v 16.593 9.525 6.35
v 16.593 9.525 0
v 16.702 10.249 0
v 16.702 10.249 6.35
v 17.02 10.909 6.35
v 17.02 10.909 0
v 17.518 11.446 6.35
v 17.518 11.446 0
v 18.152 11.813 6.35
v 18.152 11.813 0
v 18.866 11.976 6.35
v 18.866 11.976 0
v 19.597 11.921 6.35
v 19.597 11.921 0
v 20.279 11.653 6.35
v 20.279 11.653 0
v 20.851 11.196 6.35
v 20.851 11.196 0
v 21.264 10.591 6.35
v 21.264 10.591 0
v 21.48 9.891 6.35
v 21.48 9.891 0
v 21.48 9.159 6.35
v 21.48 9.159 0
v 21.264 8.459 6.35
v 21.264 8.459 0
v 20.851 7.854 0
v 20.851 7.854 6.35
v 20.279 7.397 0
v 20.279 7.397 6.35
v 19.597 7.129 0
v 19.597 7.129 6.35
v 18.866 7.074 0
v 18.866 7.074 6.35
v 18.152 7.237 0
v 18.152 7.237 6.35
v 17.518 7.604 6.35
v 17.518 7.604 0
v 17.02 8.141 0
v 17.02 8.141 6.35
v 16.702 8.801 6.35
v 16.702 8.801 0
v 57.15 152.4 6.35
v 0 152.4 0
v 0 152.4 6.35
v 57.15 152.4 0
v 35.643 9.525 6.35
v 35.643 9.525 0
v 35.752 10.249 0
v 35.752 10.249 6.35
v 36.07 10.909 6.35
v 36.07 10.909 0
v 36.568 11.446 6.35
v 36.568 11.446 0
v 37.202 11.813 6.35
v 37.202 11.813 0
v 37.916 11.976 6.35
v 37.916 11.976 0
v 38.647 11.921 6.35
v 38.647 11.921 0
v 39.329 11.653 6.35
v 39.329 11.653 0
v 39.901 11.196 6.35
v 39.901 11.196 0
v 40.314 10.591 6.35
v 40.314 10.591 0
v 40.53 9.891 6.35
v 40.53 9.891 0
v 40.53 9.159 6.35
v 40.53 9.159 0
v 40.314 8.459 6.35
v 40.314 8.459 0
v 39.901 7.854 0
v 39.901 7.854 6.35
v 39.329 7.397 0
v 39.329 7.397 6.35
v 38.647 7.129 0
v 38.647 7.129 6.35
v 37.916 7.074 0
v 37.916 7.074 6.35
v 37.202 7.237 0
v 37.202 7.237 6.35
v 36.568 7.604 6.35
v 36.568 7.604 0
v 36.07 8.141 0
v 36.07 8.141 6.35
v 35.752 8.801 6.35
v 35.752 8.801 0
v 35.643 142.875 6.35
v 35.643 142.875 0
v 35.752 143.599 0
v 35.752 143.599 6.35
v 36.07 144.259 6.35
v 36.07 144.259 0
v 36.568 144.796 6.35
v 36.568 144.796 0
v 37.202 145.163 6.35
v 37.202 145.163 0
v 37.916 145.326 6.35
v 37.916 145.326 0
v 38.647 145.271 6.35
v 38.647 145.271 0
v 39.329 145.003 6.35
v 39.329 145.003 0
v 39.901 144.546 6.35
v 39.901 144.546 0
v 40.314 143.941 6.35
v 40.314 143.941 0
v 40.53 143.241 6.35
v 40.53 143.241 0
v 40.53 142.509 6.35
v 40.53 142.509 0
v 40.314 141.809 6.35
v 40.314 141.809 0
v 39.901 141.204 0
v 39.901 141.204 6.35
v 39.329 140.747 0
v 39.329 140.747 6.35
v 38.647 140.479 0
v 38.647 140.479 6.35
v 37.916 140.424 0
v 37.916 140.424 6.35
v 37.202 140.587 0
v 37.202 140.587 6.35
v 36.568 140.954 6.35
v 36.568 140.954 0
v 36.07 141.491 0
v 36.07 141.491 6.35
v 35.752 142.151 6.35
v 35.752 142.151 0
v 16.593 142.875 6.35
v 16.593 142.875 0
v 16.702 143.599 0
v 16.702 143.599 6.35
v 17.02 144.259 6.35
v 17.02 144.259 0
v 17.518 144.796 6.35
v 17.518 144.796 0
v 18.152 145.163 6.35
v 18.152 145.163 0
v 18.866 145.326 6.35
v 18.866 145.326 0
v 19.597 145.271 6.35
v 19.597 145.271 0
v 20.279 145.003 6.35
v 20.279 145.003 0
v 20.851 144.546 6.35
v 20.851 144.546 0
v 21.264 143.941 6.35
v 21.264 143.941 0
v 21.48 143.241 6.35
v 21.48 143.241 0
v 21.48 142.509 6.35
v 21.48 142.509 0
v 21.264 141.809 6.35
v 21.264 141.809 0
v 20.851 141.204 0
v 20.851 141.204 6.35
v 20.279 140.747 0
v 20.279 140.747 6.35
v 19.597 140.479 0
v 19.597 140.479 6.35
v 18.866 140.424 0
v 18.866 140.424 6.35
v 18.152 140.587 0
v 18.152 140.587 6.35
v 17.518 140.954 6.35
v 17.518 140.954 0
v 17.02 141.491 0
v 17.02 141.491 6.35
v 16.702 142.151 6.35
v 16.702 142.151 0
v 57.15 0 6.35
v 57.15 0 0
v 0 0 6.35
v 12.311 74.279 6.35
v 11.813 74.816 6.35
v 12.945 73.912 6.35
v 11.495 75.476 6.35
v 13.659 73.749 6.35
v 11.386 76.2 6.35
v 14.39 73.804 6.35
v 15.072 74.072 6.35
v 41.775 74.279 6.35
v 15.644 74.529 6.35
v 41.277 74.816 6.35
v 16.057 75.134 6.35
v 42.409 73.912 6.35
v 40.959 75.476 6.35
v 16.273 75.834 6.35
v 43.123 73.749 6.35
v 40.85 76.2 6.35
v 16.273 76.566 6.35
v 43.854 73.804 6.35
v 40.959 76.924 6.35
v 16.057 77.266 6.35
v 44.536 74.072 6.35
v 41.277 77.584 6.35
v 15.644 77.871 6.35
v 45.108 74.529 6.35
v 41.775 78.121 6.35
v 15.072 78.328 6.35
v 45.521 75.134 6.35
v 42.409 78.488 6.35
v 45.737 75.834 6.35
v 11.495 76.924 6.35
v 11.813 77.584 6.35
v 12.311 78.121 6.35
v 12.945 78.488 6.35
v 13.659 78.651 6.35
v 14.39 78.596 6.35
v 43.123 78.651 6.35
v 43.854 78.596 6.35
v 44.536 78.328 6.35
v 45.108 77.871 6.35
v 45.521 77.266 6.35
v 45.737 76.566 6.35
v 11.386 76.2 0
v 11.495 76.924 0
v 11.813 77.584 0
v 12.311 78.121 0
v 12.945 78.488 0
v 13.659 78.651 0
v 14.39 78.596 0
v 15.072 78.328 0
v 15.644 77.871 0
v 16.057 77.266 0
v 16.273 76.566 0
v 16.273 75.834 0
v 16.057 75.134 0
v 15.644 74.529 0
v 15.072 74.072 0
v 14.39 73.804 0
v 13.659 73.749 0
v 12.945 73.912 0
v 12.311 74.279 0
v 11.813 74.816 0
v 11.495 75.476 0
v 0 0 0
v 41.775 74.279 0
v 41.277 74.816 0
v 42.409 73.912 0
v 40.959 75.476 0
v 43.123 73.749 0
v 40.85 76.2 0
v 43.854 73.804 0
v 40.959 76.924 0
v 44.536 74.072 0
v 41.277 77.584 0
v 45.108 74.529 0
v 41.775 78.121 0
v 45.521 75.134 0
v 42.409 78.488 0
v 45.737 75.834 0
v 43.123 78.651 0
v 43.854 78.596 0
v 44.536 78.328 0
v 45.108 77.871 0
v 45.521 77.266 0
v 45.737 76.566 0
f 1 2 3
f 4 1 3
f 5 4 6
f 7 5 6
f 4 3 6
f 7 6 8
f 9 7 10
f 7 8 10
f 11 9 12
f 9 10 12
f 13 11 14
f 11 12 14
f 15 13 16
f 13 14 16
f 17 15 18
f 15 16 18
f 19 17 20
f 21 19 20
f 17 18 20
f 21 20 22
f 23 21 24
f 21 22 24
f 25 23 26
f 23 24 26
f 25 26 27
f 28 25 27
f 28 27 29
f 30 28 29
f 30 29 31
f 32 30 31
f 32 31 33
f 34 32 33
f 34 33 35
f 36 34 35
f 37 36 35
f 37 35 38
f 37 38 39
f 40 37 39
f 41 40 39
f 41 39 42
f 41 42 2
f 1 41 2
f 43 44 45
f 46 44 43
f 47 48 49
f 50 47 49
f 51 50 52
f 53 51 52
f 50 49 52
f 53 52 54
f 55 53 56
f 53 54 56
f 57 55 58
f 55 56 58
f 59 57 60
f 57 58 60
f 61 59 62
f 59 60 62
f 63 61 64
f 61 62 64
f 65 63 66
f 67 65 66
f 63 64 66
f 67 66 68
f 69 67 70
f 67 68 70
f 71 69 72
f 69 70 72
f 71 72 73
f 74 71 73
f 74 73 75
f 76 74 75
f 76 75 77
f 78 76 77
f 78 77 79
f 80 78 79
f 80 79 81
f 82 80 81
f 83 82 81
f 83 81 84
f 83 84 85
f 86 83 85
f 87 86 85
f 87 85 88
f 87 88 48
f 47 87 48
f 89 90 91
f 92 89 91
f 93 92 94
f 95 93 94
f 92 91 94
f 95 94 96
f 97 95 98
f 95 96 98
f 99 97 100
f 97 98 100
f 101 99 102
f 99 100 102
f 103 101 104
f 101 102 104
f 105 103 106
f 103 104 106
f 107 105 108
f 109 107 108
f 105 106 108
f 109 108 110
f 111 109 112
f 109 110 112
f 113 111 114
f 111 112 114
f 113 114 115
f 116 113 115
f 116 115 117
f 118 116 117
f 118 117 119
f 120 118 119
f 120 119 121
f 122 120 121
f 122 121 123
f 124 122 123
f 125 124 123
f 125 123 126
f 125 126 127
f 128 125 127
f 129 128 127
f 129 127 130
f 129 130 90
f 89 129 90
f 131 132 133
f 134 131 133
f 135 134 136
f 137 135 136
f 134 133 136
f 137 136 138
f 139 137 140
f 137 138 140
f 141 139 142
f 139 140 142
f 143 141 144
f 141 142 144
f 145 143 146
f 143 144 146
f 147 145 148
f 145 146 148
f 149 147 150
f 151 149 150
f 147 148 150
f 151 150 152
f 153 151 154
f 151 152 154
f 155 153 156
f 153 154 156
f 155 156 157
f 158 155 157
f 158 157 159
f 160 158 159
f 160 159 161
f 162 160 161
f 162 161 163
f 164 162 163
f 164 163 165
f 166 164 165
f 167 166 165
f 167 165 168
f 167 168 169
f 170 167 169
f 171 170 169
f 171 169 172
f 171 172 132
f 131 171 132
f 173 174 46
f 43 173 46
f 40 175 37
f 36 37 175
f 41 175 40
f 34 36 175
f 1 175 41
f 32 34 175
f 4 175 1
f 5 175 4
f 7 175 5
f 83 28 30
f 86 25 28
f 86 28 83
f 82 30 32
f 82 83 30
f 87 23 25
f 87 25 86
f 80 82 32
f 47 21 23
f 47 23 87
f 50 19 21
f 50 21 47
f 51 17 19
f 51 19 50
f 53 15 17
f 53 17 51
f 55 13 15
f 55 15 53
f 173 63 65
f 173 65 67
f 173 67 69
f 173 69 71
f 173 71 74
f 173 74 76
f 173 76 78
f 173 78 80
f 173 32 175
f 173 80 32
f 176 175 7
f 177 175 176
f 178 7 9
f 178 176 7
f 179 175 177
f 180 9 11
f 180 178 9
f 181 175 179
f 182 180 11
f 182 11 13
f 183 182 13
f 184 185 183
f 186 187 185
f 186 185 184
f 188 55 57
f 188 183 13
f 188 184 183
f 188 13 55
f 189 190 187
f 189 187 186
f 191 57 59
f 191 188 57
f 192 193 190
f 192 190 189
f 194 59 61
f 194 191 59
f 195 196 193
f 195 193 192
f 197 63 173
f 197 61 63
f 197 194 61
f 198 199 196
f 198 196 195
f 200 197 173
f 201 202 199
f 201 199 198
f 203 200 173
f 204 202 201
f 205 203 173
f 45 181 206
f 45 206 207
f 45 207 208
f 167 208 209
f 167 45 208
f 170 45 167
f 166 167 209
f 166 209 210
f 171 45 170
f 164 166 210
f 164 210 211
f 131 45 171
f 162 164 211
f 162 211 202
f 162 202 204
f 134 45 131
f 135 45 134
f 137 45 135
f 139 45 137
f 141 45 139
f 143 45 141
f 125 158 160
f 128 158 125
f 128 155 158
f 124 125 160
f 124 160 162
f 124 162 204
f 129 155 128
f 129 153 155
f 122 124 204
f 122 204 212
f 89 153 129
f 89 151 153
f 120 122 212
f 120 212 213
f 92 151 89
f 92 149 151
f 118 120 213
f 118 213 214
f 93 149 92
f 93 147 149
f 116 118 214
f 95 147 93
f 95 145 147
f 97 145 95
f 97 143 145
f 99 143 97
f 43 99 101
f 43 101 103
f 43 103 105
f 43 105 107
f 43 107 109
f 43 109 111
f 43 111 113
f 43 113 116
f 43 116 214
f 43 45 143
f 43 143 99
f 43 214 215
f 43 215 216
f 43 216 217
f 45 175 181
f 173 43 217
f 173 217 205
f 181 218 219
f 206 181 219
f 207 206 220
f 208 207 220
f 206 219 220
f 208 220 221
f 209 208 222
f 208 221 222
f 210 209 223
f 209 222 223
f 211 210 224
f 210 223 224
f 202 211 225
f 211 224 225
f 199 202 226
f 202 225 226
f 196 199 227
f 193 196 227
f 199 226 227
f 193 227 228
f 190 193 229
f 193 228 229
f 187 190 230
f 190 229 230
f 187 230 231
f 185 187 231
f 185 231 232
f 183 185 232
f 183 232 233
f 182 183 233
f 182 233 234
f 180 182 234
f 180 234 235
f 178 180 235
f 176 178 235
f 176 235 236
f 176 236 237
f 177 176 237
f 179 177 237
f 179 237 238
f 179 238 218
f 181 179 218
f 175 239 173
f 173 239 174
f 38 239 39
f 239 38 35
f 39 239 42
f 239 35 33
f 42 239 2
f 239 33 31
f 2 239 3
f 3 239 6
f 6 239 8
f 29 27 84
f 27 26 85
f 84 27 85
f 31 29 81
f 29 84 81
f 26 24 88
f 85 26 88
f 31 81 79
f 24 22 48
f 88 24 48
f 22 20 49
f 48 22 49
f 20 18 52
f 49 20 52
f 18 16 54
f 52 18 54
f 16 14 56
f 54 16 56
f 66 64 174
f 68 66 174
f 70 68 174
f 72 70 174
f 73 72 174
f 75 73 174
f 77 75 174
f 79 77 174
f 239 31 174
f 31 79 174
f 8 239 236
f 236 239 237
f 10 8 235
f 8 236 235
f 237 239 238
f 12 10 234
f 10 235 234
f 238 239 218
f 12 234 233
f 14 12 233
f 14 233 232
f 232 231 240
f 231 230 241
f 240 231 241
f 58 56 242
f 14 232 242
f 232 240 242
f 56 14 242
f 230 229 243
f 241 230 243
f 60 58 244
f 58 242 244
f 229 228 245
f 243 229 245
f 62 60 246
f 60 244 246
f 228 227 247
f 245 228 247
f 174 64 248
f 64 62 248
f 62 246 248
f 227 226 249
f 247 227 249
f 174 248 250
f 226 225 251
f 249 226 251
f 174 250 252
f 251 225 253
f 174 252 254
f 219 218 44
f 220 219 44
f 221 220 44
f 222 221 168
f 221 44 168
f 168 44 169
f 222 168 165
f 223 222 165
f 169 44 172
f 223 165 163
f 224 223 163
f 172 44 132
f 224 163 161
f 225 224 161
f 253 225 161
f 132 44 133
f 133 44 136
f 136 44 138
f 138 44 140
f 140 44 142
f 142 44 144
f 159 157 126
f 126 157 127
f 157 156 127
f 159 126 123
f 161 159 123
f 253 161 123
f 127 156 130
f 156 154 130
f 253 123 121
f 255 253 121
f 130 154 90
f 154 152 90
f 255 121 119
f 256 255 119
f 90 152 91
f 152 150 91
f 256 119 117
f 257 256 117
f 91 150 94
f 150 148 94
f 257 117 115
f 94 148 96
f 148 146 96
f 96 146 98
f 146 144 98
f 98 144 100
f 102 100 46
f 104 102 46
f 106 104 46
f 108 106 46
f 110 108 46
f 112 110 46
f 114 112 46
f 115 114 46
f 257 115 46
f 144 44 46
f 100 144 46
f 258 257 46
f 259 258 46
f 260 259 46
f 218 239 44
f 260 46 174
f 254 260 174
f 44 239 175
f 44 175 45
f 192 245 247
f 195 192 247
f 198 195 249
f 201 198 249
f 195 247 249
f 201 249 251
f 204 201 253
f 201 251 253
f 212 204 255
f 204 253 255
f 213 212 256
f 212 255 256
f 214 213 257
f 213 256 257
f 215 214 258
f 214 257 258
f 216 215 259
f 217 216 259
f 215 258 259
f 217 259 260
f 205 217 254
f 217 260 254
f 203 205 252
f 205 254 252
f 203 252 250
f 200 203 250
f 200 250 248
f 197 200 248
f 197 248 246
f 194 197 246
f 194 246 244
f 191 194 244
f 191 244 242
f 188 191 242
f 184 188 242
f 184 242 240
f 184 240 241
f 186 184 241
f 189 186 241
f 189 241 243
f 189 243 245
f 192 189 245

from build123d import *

# Parameters (mm, degrees)
SKETCH2_W                 = 57.15
SKETCH2_H                 = 152.4
BOSS_EXTRUDE1_DEPTH       = 6.35
F_8_CLEARANCE_HOLE1_D     = 4.9149
F_8_CLEARANCE_HOLE1_DEPTH = 9.191415072
F_8_CLEARANCE_HOLE1_TIP   = 1.476584928


with BuildPart() as part:
    # Sketch2 → Boss-Extrude1 (new body)
    with BuildSketch(Plane.XY):
        with Locations((28.575, 76.2)):
            Rectangle(SKETCH2_W, SKETCH2_H)
    extrude(amount=BOSS_EXTRUDE1_DEPTH)

    # #8 Clearance Hole1
    with Locations(Plane.XY.offset(6.35)):
        with Locations((19.05, 9.525), (38.1, 9.525), (19.05, 142.875), (38.1, 142.875), (13.843, 76.2), (43.307, 76.2)):
            Hole(F_8_CLEARANCE_HOLE1_D / 2, depth=F_8_CLEARANCE_HOLE1_DEPTH)
            with Locations((0, 0, -(F_8_CLEARANCE_HOLE1_DEPTH + F_8_CLEARANCE_HOLE1_TIP / 2))):  # 118° drill point
                Cone(0, F_8_CLEARANCE_HOLE1_D / 2, F_8_CLEARANCE_HOLE1_TIP, mode=Mode.SUBTRACT)


solid = part.part
